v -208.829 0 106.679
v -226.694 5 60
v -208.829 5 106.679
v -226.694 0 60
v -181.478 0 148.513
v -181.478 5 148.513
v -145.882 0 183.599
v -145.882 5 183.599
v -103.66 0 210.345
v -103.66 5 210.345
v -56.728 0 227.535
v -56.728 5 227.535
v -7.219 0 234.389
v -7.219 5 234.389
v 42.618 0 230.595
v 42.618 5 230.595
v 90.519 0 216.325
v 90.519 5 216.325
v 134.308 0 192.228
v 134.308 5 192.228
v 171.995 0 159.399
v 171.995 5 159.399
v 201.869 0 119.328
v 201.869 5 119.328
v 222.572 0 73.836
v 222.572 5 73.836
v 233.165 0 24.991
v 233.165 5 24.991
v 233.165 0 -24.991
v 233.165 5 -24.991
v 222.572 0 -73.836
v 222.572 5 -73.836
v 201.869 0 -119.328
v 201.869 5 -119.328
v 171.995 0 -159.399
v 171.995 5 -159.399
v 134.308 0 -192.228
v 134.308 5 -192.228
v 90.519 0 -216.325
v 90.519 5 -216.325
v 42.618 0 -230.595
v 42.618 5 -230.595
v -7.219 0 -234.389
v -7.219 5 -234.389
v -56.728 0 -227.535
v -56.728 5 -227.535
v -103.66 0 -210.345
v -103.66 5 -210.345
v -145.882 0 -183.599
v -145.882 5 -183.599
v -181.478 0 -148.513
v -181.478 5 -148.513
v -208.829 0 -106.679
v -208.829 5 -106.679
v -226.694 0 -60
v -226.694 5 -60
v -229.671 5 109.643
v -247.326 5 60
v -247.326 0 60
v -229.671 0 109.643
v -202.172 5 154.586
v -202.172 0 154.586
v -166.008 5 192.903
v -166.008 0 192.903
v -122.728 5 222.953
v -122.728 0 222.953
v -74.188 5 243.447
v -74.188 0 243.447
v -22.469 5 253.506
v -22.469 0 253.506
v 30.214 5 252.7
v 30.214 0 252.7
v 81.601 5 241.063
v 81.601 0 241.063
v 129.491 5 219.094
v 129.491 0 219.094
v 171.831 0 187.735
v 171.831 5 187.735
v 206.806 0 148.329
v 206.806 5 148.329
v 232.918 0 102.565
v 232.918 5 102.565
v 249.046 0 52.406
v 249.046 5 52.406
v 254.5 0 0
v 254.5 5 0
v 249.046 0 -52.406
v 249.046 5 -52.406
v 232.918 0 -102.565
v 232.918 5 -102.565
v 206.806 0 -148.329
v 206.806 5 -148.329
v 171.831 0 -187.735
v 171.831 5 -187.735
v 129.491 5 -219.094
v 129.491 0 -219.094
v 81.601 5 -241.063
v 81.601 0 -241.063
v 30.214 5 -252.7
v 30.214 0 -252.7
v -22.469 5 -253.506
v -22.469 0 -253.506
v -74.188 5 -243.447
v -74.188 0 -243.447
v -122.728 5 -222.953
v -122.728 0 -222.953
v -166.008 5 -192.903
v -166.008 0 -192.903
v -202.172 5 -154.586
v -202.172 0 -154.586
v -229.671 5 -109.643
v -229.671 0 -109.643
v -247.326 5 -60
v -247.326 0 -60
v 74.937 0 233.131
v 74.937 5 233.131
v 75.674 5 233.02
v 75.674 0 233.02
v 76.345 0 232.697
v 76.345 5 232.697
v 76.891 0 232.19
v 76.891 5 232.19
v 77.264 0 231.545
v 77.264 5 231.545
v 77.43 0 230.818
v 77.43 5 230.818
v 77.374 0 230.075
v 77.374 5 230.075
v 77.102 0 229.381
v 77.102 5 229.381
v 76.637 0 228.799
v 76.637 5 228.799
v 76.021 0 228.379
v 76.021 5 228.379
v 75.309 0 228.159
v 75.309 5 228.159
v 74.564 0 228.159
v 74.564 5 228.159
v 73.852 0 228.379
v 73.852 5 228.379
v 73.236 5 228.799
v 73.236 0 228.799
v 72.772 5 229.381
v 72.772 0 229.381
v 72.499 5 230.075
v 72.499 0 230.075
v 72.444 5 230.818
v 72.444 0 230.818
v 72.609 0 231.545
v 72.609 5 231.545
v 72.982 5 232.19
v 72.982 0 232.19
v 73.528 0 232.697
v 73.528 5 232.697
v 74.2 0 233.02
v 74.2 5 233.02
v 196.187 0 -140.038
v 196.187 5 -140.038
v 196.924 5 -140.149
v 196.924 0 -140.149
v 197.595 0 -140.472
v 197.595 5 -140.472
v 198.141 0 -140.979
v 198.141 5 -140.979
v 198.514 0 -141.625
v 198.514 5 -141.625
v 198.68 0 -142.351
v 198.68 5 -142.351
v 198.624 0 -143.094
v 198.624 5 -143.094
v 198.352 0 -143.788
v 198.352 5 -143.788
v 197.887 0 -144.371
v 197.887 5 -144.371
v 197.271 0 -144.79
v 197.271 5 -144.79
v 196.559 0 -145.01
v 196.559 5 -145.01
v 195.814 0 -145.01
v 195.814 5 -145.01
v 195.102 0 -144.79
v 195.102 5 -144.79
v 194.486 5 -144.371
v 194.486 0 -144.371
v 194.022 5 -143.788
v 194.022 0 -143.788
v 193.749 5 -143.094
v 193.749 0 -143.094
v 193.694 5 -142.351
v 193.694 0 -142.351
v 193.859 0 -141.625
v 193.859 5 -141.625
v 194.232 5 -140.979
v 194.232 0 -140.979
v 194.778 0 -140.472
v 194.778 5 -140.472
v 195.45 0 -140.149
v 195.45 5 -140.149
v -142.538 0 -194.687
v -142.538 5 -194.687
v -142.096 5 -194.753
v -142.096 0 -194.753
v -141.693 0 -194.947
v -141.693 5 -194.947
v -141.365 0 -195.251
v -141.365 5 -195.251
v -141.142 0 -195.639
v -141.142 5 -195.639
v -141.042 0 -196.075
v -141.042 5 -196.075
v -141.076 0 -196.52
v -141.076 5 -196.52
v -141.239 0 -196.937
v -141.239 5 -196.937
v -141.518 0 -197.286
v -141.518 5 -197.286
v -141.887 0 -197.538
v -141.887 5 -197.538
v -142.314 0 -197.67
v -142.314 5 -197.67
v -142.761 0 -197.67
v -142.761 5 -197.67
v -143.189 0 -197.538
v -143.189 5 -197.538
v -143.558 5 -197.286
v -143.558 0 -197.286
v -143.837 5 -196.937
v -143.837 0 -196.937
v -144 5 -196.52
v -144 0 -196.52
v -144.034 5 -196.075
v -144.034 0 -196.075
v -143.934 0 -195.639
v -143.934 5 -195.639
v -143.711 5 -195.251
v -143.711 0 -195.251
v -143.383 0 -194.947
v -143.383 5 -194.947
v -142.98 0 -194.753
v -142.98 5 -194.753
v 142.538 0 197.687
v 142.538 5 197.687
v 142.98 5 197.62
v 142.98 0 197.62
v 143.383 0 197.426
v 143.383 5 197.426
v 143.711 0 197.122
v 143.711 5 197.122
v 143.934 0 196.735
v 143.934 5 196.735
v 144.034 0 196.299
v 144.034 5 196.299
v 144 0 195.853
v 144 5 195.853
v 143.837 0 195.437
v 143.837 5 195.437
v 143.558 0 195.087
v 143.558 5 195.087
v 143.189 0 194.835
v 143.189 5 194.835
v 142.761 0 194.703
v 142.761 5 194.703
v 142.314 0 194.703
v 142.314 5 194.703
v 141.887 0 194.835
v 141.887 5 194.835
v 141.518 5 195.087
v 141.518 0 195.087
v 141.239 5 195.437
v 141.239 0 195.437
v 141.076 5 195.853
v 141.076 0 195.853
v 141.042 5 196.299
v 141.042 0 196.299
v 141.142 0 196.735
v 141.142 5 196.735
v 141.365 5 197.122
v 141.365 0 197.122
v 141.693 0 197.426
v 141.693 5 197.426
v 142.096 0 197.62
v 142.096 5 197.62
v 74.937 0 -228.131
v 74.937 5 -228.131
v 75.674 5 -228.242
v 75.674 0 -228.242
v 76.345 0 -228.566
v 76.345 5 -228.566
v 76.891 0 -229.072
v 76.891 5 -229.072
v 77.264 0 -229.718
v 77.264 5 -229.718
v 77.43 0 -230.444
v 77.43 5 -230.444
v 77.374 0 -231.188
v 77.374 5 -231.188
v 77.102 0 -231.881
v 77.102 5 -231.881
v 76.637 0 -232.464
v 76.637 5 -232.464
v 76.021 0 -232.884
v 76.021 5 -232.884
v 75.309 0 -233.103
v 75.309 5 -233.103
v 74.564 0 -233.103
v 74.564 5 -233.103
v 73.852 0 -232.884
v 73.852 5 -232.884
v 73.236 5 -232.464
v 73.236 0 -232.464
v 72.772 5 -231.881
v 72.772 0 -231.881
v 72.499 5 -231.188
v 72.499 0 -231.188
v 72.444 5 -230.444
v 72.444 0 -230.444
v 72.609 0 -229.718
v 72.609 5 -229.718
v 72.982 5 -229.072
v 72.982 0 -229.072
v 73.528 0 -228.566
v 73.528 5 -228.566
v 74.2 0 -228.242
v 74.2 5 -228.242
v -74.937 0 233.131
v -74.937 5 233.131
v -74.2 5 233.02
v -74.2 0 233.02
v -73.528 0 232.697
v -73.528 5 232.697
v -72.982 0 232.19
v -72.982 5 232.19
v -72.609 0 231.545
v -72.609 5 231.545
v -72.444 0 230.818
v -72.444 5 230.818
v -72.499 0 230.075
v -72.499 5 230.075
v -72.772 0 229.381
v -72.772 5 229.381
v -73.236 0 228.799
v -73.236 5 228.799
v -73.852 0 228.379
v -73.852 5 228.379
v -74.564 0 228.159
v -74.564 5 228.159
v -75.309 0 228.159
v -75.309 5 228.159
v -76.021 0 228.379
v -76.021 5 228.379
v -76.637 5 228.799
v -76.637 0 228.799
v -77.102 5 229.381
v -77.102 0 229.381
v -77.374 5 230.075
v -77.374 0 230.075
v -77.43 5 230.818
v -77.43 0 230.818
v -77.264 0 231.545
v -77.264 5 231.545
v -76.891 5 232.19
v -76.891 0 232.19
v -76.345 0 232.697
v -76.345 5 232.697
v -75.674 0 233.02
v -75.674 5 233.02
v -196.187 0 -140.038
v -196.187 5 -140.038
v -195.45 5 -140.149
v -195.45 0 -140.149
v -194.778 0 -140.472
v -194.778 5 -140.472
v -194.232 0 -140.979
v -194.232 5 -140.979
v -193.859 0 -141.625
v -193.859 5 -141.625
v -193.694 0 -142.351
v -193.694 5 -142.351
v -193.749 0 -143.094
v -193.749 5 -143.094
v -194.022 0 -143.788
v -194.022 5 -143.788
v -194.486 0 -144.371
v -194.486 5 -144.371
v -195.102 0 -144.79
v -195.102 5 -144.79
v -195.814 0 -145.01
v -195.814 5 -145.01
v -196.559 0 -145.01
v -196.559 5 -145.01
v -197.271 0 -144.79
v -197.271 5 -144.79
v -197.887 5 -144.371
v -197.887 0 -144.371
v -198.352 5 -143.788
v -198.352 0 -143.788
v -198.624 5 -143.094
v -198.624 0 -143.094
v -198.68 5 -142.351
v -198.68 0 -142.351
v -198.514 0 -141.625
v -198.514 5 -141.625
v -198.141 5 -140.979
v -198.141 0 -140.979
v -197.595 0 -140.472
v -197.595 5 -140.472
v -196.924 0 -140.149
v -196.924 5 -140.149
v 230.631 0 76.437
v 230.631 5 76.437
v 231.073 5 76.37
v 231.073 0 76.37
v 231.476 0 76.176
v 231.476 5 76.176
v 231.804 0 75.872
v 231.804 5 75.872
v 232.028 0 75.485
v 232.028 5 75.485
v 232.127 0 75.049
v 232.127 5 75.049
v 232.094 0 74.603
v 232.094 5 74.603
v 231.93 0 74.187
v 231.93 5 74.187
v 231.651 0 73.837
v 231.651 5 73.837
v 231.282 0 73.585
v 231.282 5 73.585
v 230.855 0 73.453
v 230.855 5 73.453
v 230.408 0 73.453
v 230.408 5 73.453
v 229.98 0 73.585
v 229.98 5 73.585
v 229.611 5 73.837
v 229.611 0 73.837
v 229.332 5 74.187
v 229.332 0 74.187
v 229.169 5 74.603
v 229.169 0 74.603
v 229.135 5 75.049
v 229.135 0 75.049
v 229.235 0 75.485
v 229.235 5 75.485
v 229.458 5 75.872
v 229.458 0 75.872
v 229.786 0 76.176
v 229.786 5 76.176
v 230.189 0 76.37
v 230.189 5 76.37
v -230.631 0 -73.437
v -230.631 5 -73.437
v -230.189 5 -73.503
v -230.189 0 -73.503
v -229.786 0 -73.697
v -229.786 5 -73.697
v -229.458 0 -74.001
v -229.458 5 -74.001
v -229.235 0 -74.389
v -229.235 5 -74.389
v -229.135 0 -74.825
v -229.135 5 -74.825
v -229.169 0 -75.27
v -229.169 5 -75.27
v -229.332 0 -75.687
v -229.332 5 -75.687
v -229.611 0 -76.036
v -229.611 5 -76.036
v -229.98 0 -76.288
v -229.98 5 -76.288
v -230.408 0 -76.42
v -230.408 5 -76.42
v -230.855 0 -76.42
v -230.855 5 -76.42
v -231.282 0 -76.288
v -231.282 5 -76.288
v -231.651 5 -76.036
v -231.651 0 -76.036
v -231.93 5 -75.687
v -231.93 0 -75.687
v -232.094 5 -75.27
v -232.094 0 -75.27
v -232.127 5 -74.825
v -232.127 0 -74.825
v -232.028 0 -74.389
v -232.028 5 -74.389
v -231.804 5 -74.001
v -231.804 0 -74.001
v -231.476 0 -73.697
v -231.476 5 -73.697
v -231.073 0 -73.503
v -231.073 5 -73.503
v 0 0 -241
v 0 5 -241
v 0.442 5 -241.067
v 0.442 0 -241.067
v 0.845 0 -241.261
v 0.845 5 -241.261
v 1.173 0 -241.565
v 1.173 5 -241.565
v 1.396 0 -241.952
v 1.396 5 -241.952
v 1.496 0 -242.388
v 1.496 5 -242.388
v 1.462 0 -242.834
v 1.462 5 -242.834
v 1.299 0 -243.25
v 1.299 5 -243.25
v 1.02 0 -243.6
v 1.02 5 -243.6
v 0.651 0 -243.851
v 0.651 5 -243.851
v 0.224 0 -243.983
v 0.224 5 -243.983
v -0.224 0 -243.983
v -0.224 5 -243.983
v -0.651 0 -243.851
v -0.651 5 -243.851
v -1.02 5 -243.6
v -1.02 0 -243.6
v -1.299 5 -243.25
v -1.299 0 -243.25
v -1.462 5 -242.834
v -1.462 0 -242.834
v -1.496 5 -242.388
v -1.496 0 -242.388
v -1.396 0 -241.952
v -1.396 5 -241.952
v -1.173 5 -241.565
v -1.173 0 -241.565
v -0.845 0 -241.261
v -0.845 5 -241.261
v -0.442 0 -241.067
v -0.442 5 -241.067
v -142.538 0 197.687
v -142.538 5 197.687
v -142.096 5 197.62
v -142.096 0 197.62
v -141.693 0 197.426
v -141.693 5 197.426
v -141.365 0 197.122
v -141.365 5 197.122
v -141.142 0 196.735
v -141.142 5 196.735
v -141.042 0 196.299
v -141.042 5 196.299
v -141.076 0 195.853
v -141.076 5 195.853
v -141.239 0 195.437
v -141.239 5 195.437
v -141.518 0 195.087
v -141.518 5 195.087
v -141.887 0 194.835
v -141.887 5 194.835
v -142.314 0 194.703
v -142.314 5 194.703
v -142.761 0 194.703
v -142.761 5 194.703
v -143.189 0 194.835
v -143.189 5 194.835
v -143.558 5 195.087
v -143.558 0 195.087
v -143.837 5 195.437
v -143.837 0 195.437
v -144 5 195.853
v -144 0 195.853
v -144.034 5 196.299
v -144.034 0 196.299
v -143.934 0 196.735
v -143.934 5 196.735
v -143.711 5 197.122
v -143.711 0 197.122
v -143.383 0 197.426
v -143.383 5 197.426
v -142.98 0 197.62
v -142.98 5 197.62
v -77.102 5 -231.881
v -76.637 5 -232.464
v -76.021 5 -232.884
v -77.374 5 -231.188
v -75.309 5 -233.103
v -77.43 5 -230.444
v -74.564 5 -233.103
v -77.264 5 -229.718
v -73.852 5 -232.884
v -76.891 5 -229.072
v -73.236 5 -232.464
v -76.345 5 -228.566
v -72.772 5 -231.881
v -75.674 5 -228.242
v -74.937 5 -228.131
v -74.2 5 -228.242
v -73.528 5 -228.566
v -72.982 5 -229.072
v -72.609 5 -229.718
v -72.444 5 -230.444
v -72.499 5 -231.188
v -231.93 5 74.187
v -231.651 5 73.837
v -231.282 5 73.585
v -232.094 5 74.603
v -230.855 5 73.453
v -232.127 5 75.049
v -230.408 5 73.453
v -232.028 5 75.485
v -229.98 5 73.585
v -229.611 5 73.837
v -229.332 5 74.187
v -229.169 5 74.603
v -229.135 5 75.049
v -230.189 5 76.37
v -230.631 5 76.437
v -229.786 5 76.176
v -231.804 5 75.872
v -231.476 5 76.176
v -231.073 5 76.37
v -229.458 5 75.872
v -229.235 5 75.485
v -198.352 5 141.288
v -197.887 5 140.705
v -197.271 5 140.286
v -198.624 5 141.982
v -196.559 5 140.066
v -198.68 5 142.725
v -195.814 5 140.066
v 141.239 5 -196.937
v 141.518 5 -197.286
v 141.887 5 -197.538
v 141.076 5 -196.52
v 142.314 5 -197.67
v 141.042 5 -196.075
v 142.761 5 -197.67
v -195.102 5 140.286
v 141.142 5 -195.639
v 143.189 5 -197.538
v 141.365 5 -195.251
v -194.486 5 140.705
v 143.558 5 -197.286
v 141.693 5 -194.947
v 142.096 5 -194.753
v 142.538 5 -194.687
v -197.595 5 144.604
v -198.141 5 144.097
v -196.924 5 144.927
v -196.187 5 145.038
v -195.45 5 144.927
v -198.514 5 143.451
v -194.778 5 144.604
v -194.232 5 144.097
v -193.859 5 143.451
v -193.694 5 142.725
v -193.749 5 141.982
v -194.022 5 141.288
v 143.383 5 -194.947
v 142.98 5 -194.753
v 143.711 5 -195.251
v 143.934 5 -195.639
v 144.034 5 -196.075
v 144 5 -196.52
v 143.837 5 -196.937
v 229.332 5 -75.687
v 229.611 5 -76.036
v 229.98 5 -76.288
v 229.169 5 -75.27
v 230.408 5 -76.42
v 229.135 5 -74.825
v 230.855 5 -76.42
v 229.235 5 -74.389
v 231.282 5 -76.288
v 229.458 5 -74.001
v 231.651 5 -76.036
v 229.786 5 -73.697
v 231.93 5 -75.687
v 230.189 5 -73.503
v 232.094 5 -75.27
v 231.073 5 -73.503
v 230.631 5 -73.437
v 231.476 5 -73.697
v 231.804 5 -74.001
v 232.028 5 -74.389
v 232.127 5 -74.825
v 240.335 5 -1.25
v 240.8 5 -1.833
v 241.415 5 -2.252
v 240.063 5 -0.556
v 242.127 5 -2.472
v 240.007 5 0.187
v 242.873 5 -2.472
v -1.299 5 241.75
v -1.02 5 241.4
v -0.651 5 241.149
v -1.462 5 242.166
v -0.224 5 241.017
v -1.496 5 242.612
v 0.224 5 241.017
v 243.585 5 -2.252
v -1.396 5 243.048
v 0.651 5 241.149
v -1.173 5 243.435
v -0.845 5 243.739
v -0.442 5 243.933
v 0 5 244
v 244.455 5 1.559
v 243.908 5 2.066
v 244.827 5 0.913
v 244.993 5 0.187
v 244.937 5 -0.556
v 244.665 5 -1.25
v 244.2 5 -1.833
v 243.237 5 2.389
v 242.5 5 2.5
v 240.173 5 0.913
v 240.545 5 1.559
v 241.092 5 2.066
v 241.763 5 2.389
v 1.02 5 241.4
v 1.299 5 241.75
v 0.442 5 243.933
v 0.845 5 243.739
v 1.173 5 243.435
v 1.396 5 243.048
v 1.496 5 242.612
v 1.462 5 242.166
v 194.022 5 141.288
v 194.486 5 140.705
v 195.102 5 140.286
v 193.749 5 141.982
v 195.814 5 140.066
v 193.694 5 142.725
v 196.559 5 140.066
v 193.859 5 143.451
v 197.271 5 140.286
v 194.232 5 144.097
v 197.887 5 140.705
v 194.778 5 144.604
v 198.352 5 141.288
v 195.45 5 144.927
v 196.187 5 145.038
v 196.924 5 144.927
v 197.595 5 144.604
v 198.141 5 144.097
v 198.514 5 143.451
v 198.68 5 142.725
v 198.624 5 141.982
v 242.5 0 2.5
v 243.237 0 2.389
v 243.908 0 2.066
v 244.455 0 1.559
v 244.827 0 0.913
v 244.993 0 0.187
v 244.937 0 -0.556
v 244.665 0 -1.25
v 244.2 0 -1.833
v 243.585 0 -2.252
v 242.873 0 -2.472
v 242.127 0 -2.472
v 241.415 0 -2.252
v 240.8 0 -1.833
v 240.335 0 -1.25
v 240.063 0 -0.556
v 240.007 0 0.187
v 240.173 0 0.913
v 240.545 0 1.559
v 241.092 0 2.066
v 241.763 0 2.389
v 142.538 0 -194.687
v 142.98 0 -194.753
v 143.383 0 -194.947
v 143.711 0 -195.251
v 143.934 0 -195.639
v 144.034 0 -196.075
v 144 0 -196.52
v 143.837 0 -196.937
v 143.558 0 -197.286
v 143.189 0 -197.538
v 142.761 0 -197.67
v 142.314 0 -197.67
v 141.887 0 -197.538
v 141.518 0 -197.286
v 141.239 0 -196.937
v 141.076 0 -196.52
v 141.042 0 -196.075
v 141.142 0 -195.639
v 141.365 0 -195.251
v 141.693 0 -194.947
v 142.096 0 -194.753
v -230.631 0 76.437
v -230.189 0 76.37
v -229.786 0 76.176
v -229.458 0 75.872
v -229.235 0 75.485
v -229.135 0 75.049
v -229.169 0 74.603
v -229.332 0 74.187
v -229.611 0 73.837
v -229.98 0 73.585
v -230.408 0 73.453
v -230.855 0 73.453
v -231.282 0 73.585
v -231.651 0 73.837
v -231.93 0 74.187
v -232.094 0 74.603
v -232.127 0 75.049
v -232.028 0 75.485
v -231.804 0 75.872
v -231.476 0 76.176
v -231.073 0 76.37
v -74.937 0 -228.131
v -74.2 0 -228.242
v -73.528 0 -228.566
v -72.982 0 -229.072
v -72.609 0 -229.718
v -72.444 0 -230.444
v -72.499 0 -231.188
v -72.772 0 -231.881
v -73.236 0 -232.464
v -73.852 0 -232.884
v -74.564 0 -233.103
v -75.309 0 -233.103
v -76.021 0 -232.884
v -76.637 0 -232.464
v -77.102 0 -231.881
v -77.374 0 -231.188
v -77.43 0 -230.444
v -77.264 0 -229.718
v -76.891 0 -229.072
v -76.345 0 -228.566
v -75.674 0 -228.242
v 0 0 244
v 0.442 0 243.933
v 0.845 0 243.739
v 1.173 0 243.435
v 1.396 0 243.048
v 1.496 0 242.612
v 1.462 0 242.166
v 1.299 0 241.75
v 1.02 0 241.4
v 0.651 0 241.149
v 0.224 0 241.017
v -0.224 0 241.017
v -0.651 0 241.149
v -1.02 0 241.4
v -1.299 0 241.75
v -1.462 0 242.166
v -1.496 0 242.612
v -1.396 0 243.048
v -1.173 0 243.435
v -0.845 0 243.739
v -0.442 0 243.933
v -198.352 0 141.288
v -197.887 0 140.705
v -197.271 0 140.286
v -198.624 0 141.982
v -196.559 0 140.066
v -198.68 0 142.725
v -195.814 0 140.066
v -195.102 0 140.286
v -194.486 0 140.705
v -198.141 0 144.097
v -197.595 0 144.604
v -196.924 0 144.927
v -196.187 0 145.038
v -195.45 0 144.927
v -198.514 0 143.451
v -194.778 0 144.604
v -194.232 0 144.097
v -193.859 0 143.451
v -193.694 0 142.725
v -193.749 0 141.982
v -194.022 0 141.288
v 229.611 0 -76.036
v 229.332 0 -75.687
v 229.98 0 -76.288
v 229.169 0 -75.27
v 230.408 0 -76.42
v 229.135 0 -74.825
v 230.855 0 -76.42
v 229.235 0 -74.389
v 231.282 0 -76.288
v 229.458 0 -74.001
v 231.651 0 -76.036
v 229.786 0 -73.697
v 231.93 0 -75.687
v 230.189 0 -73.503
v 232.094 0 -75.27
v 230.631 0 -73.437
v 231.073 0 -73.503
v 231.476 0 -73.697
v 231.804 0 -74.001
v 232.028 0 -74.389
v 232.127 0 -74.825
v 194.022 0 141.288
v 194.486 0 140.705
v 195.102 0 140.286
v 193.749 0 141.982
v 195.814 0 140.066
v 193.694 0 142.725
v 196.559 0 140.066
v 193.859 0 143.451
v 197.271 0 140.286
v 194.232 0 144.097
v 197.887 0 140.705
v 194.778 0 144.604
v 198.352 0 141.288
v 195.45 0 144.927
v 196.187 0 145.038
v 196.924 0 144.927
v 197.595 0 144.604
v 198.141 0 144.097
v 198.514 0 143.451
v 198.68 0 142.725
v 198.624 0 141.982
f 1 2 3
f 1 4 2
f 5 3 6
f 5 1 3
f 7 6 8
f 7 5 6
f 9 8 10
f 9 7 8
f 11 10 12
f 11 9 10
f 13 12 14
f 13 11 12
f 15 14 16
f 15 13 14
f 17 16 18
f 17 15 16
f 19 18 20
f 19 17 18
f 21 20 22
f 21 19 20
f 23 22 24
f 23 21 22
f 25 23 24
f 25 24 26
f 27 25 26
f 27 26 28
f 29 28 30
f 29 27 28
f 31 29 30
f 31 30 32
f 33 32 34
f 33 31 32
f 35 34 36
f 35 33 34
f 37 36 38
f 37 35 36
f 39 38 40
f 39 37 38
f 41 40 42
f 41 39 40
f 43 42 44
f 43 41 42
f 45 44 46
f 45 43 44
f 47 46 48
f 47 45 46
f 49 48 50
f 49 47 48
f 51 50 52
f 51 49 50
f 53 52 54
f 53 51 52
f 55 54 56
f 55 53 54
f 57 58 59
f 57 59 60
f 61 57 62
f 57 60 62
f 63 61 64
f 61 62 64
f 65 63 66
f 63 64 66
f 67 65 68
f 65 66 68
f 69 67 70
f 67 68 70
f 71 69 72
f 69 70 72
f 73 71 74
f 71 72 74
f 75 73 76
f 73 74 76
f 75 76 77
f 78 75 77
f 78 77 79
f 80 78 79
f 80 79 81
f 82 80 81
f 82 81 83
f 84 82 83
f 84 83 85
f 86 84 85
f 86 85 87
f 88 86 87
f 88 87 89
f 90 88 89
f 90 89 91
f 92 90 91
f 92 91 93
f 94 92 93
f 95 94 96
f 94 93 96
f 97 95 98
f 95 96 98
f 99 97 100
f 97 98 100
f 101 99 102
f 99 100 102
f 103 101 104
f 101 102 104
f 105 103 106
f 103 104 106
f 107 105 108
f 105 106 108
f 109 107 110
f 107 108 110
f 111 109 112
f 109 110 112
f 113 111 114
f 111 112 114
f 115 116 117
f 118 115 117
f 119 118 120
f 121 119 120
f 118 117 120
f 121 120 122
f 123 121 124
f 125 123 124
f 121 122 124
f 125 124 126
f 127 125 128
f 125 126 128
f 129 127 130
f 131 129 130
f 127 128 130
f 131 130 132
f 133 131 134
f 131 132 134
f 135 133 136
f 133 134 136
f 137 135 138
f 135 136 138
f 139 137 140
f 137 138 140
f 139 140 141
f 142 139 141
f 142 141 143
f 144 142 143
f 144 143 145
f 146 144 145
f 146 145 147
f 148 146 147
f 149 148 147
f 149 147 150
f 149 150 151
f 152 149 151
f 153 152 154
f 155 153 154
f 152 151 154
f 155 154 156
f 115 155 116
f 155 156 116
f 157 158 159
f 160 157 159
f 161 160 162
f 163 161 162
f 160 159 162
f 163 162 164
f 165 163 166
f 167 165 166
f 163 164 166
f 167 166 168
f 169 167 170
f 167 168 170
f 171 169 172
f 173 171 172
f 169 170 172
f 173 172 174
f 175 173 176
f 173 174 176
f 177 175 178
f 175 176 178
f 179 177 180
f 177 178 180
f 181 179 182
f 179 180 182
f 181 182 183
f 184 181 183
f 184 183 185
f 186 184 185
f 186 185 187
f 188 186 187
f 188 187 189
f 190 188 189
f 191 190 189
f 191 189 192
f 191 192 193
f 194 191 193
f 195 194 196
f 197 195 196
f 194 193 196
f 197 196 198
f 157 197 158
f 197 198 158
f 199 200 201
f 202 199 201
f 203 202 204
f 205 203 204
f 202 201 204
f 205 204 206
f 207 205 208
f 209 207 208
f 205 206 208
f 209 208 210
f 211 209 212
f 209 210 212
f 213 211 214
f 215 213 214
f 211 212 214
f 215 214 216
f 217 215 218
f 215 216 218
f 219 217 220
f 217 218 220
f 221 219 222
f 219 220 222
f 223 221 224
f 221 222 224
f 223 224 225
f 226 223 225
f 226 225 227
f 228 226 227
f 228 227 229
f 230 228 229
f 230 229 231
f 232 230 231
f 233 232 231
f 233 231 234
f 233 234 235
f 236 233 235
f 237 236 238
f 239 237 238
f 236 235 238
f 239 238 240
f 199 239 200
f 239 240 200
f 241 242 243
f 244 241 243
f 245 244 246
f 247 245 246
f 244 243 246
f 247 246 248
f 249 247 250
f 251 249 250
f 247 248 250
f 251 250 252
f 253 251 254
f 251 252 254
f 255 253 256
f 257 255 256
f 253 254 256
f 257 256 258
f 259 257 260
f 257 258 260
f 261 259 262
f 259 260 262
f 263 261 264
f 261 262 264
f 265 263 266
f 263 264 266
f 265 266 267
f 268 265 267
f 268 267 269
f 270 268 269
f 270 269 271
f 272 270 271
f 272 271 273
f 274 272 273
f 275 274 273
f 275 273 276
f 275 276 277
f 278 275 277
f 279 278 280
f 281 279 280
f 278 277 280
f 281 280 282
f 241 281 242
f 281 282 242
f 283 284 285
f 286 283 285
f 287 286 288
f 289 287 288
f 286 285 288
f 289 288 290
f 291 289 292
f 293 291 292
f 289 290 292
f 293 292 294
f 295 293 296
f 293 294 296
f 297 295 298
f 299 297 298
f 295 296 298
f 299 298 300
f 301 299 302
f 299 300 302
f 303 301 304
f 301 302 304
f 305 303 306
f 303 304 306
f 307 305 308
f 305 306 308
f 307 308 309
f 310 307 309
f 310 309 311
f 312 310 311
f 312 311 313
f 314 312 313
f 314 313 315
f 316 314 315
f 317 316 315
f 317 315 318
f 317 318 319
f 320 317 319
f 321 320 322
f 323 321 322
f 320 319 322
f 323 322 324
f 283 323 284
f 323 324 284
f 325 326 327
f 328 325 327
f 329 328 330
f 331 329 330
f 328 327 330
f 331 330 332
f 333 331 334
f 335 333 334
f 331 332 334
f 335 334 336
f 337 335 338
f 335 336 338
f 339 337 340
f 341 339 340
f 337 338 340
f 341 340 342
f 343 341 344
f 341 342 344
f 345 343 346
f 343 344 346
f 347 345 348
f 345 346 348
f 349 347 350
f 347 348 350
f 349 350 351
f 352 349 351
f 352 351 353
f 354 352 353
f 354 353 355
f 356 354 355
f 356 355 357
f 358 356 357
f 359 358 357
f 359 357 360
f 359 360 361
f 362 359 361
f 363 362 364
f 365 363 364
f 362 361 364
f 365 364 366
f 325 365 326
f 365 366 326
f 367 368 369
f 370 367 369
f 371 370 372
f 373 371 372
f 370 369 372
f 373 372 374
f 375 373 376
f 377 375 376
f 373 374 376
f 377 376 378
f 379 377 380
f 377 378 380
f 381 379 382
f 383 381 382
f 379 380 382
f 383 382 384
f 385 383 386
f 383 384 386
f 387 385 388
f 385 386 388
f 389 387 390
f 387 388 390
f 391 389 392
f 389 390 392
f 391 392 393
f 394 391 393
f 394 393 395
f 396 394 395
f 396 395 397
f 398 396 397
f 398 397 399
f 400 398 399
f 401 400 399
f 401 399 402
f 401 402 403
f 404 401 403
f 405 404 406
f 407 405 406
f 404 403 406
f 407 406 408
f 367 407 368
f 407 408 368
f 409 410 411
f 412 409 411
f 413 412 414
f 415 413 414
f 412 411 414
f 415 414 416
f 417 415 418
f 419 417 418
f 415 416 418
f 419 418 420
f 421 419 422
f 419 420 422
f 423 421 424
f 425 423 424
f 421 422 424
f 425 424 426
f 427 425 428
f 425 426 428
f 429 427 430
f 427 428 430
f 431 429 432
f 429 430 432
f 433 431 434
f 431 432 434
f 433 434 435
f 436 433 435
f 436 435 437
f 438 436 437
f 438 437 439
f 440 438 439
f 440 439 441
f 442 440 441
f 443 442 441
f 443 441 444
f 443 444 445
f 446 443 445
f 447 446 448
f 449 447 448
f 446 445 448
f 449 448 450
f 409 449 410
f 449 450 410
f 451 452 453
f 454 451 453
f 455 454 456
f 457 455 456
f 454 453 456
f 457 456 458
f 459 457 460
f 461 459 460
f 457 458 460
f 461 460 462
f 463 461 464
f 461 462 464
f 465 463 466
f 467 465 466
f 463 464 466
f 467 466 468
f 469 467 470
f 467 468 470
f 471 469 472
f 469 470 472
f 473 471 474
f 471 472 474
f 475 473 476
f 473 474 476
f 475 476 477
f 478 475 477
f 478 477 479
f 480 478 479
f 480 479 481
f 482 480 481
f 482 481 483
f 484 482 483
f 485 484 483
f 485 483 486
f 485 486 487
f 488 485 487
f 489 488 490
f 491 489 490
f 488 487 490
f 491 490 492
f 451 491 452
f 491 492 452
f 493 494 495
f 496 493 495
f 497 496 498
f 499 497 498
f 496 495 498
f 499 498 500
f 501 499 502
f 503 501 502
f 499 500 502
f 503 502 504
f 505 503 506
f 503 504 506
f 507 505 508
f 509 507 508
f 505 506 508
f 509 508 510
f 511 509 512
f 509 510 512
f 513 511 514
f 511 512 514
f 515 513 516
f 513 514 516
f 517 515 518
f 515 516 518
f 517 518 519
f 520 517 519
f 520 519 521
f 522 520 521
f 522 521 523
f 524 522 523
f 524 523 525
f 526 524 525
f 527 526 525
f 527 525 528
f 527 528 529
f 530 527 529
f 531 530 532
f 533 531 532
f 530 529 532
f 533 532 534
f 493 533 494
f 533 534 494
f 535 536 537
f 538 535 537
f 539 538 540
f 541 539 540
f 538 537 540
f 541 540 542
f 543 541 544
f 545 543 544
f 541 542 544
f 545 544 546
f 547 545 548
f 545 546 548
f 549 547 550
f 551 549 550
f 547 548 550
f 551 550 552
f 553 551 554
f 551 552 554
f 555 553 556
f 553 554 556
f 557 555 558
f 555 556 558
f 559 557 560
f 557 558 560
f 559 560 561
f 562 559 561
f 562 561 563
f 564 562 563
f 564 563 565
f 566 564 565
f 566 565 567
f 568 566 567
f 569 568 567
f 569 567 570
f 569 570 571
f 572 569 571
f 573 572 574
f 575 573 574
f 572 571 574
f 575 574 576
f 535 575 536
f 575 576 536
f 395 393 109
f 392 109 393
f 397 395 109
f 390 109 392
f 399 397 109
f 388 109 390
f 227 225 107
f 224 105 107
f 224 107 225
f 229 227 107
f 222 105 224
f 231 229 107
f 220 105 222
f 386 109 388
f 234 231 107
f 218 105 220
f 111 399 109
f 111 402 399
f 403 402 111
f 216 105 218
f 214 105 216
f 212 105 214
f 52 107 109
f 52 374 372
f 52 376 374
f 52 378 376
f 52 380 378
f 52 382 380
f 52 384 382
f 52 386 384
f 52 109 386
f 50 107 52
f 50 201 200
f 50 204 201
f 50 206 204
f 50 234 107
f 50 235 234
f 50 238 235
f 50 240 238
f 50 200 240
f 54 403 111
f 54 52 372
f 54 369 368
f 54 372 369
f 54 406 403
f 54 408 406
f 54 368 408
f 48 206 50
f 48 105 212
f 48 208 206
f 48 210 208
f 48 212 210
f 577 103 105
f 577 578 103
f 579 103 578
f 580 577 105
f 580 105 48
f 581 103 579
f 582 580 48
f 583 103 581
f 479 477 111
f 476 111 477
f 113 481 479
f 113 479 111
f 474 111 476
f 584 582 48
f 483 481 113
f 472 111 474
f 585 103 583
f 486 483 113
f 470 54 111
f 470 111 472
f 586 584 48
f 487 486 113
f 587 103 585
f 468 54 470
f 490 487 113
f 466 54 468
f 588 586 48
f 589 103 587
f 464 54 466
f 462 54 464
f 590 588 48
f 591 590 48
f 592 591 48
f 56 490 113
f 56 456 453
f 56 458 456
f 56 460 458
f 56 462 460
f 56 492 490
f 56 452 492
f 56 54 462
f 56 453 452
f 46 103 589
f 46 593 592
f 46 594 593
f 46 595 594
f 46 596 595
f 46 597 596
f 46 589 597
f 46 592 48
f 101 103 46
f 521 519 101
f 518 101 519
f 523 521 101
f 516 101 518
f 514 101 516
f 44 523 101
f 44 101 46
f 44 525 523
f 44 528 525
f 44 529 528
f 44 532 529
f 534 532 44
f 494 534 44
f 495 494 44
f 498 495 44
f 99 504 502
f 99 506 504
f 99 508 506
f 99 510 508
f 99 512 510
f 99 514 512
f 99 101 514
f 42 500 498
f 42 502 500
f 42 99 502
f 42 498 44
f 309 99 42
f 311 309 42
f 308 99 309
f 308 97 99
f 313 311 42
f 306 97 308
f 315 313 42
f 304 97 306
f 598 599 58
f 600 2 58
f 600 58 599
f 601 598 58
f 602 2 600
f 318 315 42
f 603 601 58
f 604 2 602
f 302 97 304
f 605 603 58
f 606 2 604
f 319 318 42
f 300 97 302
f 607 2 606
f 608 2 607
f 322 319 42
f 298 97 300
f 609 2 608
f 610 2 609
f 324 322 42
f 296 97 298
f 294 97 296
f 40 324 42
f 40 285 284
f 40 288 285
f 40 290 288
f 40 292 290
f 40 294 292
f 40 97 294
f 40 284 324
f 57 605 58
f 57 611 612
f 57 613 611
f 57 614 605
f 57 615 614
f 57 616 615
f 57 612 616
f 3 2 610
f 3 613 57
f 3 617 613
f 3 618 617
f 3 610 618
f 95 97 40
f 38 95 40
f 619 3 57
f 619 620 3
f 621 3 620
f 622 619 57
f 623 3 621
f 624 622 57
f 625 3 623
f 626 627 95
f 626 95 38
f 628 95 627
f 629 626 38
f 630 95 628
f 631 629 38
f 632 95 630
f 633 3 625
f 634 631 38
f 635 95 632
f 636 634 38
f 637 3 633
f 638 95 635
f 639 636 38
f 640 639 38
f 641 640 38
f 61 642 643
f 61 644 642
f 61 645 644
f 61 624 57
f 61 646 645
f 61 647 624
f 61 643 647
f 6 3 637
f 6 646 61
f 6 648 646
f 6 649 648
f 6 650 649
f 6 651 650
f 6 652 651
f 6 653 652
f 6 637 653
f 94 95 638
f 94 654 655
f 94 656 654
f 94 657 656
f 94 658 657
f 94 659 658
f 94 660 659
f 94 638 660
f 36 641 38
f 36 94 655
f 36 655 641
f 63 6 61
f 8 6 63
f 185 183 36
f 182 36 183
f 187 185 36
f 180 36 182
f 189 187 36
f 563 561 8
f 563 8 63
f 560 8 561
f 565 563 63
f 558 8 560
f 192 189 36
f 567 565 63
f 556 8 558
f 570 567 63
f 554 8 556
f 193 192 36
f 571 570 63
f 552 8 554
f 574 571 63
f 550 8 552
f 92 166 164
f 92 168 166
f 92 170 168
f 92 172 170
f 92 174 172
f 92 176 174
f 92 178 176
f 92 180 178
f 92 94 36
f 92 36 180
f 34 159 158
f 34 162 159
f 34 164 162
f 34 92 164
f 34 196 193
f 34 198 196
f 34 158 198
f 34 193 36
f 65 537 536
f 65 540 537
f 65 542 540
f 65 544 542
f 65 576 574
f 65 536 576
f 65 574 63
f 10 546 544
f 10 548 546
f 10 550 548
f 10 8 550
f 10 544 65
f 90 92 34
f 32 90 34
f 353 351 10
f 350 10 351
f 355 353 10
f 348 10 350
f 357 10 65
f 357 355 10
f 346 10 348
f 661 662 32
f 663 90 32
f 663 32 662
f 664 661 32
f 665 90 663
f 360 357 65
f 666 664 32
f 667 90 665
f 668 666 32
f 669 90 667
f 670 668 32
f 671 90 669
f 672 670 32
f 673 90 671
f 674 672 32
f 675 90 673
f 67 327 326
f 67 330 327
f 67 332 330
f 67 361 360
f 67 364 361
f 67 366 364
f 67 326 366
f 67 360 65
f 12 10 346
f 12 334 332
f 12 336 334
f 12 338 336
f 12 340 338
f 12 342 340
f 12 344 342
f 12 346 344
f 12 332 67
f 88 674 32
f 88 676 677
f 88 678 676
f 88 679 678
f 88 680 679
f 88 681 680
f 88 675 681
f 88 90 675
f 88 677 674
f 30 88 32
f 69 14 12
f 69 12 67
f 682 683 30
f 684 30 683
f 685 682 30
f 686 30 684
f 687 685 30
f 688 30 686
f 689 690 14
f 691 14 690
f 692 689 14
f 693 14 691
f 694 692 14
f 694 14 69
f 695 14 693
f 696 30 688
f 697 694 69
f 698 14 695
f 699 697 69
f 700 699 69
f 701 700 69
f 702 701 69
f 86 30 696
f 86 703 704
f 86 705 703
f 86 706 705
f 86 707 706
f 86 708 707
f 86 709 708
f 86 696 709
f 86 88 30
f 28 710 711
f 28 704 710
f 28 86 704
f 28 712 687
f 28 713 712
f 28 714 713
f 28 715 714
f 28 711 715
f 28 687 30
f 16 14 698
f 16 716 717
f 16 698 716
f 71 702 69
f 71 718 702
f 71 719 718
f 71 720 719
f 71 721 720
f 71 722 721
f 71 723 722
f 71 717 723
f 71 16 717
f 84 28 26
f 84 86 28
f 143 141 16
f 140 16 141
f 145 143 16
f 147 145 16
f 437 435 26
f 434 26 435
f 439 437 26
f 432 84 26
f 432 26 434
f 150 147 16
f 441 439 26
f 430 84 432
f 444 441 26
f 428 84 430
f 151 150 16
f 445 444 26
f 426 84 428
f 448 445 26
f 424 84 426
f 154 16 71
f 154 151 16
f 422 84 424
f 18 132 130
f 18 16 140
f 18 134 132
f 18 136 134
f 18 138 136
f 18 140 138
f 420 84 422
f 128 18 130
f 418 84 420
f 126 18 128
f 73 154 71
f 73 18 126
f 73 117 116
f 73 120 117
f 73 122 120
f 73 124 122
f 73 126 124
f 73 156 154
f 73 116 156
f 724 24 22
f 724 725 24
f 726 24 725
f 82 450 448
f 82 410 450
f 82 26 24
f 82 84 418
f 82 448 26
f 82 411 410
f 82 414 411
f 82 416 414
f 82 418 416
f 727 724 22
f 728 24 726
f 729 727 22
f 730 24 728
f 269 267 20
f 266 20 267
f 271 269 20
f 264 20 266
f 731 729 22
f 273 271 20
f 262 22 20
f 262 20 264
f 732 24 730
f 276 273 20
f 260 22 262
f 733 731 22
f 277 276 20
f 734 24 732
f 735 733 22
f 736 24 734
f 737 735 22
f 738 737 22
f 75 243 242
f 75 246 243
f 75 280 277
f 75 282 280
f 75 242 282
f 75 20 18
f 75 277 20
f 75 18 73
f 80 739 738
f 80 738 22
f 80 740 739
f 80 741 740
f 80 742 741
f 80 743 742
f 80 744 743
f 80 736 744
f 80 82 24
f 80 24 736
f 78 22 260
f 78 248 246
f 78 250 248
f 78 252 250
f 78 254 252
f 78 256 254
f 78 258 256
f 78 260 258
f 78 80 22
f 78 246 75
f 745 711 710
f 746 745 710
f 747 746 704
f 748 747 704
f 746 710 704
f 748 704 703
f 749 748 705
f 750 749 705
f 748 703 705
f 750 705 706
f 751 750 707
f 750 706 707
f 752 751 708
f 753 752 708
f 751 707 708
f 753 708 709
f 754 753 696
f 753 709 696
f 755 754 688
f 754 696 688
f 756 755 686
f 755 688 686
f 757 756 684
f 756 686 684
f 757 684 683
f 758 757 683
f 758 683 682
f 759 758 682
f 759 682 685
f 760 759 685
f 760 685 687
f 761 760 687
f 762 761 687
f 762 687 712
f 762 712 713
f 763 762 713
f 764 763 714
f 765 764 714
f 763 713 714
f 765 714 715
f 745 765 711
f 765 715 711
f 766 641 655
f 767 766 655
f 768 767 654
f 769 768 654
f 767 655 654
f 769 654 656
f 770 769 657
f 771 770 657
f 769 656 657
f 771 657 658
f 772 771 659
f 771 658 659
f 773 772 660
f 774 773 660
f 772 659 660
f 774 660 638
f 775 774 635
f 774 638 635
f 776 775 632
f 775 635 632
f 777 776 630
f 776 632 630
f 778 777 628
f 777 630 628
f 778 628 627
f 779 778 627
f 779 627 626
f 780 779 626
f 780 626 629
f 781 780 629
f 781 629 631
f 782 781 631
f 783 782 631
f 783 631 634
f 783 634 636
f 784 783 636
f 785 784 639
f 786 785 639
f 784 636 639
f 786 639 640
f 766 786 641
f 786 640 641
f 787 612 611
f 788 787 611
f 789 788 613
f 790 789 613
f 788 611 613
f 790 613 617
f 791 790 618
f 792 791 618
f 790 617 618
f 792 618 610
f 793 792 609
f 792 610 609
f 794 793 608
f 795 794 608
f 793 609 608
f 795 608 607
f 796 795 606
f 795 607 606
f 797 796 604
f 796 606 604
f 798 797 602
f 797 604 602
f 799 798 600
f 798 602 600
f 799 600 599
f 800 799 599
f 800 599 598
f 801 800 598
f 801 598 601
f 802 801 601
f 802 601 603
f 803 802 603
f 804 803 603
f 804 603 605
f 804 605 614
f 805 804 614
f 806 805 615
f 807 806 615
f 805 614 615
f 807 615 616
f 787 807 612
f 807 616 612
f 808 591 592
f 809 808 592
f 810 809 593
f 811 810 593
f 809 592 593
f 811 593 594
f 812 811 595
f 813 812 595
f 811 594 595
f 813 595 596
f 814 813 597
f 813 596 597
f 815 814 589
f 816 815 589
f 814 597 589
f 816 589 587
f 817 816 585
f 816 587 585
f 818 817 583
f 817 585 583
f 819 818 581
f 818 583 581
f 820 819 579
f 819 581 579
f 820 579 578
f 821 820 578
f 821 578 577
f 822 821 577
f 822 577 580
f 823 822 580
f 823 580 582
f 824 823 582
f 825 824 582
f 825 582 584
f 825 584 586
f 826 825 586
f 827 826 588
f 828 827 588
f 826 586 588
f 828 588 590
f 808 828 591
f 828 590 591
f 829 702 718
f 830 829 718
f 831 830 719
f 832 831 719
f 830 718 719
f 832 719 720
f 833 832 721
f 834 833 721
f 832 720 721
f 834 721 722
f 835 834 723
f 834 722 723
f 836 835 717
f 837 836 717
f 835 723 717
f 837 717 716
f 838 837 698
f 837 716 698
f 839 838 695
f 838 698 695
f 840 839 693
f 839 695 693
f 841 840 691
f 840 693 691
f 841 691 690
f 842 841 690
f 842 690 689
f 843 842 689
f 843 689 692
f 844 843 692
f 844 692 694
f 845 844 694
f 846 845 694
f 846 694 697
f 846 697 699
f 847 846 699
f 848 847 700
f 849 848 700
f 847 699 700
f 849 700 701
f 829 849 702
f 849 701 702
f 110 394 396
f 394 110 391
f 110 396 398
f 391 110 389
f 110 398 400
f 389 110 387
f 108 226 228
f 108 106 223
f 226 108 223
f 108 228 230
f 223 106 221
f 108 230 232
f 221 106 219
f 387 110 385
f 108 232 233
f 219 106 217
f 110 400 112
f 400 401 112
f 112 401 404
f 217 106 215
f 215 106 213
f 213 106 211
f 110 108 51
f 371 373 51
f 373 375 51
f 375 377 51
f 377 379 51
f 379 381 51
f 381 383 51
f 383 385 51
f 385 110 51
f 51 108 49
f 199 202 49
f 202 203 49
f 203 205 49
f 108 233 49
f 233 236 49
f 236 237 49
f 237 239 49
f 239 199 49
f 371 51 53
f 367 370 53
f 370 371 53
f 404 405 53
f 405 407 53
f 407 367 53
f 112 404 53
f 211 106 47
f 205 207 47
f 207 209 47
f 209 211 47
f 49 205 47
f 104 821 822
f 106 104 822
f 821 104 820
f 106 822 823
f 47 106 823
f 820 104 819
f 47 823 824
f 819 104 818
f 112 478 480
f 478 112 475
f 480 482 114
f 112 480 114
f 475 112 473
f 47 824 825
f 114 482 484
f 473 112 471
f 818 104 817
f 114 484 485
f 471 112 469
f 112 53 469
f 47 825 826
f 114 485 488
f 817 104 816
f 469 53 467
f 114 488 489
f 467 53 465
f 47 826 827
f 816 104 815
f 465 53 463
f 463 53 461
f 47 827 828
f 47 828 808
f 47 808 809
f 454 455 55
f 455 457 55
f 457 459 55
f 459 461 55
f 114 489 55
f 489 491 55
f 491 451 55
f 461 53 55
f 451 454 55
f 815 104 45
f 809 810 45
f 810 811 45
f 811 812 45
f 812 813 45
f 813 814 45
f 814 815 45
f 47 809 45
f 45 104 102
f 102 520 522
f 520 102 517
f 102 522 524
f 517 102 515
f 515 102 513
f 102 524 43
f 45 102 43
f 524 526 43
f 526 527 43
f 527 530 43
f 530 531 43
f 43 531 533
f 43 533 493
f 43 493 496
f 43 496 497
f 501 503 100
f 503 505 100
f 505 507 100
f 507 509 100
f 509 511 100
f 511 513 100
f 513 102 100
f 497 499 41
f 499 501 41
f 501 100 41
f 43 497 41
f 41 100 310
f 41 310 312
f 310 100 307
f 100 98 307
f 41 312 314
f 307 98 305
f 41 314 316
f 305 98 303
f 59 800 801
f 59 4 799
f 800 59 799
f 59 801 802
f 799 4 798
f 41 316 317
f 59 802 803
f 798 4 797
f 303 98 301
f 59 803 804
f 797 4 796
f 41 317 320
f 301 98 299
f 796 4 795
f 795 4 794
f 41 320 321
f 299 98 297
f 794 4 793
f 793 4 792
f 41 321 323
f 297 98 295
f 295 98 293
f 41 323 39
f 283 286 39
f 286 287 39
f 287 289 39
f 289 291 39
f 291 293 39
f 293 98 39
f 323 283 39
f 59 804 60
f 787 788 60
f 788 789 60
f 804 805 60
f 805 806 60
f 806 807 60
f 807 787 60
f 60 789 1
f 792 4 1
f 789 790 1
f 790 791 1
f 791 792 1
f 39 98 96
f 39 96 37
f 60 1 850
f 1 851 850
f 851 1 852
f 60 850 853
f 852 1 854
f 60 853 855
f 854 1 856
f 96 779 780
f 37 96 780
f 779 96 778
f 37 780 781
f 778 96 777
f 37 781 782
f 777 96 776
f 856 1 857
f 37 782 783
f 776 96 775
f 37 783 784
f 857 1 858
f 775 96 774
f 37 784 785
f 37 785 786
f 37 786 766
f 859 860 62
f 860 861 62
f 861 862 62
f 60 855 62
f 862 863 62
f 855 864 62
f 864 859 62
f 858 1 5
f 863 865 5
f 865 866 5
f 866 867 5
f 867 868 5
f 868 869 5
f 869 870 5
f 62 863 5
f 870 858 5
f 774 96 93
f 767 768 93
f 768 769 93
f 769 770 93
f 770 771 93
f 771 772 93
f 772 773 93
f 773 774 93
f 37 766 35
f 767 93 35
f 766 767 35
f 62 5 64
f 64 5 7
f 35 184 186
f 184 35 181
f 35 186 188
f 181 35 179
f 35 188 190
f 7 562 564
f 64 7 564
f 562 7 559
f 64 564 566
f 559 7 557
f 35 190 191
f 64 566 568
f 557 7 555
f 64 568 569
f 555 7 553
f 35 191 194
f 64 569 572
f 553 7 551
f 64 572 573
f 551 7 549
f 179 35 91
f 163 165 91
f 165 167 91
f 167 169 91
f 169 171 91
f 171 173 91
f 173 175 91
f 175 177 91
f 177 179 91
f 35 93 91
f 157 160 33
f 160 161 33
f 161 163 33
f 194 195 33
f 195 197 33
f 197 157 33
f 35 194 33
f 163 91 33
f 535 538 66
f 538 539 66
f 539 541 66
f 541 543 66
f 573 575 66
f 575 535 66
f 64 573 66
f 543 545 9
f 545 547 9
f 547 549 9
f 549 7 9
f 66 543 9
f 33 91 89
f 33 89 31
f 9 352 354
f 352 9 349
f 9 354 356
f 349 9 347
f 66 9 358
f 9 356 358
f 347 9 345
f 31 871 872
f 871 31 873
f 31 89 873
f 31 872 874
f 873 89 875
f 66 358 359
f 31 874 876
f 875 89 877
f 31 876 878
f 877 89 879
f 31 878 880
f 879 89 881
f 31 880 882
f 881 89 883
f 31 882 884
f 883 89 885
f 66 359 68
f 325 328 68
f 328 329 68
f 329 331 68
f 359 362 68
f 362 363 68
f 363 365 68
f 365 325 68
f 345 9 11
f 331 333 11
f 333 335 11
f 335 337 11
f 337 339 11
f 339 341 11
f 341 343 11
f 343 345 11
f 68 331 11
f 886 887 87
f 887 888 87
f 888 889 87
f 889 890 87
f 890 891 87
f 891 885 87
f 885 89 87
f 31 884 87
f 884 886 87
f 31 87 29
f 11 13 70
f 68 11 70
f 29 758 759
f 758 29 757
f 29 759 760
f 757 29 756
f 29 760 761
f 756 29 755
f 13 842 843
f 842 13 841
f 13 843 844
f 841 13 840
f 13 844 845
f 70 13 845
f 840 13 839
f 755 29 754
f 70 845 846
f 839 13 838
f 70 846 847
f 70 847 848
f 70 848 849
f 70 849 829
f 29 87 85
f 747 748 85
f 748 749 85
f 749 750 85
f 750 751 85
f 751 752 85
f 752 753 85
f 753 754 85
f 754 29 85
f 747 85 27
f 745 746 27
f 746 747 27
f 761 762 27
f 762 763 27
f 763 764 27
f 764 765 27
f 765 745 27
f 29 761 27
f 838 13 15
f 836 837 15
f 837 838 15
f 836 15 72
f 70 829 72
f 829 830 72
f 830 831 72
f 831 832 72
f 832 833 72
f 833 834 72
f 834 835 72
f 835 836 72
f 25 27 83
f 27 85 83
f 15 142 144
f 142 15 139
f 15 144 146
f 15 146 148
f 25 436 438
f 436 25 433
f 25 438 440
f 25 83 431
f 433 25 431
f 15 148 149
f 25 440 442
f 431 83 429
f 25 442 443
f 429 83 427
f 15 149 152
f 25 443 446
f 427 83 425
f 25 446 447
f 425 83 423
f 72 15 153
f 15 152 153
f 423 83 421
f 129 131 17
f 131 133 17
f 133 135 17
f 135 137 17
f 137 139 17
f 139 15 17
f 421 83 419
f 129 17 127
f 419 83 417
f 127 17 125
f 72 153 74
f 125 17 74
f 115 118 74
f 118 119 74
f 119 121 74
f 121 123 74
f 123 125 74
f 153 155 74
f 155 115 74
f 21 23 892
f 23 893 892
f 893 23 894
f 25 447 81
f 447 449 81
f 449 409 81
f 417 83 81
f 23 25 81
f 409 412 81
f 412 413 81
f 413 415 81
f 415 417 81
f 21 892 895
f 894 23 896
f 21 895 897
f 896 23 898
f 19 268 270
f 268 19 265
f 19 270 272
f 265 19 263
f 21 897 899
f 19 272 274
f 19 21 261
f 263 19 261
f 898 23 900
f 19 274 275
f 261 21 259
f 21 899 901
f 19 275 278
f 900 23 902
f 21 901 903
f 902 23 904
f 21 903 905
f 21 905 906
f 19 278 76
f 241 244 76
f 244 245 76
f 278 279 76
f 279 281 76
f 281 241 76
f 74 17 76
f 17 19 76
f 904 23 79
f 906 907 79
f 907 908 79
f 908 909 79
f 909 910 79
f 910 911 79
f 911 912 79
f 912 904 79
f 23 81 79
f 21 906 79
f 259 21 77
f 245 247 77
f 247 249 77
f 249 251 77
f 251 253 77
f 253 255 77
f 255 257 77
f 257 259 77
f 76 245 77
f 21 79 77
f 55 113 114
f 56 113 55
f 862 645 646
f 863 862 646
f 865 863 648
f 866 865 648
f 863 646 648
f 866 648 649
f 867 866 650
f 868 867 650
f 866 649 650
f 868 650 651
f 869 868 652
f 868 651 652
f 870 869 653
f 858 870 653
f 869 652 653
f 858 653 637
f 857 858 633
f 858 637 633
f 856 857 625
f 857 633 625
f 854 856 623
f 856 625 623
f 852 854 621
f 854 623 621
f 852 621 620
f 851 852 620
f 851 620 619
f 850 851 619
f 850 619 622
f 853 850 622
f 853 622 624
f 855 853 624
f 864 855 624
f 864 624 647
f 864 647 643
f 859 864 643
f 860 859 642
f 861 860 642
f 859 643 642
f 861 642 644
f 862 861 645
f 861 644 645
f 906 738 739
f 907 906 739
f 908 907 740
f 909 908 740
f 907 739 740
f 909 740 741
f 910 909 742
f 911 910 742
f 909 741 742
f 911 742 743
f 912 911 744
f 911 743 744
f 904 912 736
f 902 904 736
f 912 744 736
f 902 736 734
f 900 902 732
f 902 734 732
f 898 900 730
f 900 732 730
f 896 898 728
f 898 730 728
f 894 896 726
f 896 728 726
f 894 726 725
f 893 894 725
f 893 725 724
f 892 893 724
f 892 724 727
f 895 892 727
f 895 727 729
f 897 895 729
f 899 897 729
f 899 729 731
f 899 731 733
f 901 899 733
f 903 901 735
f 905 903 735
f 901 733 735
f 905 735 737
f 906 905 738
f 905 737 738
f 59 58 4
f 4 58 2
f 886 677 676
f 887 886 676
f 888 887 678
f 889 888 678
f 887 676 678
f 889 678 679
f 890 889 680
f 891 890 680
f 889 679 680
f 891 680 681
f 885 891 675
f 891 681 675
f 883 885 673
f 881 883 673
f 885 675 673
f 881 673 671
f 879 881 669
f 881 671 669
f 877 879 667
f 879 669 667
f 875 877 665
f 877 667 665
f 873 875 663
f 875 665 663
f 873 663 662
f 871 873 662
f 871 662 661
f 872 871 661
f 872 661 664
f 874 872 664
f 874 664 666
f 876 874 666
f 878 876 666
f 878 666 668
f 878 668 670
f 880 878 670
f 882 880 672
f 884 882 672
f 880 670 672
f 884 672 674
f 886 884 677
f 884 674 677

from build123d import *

# Parameters (mm, degrees)
SKETCH1_R           = 254.5
SKETCH1_R_2         = 234.5
BOSS_EXTRUDE1_DEPTH = 5
SKETCH2_W           = 27.805822748
SKETCH2_H           = 60
CUT_EXTRUDE1_DEPTH  = 5
SKETCH3_R           = 2.5
CUT_EXTRUDE2_DEPTH  = 5
SKETCH4_R           = 1.5
CUT_EXTRUDE3_DEPTH  = 5


with BuildPart() as part:
    # Sketch1 → Boss-Extrude1 (new body)
    with BuildSketch(Plane(origin=(0, 0, 0), x_dir=(1, 0, 0), z_dir=(0, 1, 0))):
        with Locations(Location((0, 0, 0), (0, 0, 270))):
            Circle(SKETCH1_R)
        with Locations(Location((0, 0, 0), (0, 0, 270))):
            Circle(SKETCH1_R_2, mode=Mode.SUBTRACT)
    extrude(amount=BOSS_EXTRUDE1_DEPTH)

    # Sketch2 → Cut-Extrude1 (cut)
    with BuildSketch(Plane(origin=(0, 5, 0), x_dir=(1, 0, 0), z_dir=(0, 1, 0))):
        with Locations((-240.597088626, 30)):
            Rectangle(SKETCH2_W, SKETCH2_H)
    cut_extrude1 = extrude(amount=-CUT_EXTRUDE1_DEPTH, mode=Mode.SUBTRACT)

    # Mirror1: Cut-Extrude1 across plane
    add(cut_extrude1.mirror(Plane.XY), mode=Mode.SUBTRACT)

    # Sketch3 → Cut-Extrude2 (cut)
    with BuildSketch(Plane(origin=(0, 5, 0), x_dir=(1, 0, 0), z_dir=(0, 1, 0))):
        with Locations(Location((242.5, 0, 0), (0, 0, 270))):
            Circle(SKETCH3_R)
        with Locations(Location((196.186621136, -142.537923681, 0), (0, 0, 270))):
            Circle(SKETCH3_R)
        with Locations(Location((74.936621136, -230.631205202, 0), (0, 0, 270))):
            Circle(SKETCH3_R)
        with Locations(Location((-74.936621136, -230.631205202, 0), (0, 0, 270))):
            Circle(SKETCH3_R)
        with Locations(Location((-196.186621136, -142.537923681, 0), (0, 0, 270))):
            Circle(SKETCH3_R)
        with Locations((-242.5, 0)):
            Circle(SKETCH3_R)
        with Locations(Location((-196.186621136, 142.537923681, 0), (0, 0, 270))):
            Circle(SKETCH3_R)
        with Locations(Location((-74.936621136, 230.631205202, 0), (0, 0, 270))):
            Circle(SKETCH3_R)
        with Locations(Location((74.936621136, 230.631205202, 0), (0, 0, 270))):
            Circle(SKETCH3_R)
        with Locations(Location((196.186621136, 142.537923681, 0), (0, 0, 270))):
            Circle(SKETCH3_R)
    extrude(amount=-CUT_EXTRUDE2_DEPTH, mode=Mode.SUBTRACT)

    # Sketch4 → Cut-Extrude3 (cut)
    with BuildSketch(Plane(origin=(0, 5, 0), x_dir=(1, 0, 0), z_dir=(0, 1, 0))):
        with Locations(Location((0, -242.5, 0), (0, 0, 270))):
            Circle(SKETCH4_R)
        with Locations(Location((-142.537923681, -196.186621136, 0), (0, 0, 270))):
            Circle(SKETCH4_R)
        with Locations(Location((-230.631205202, -74.936621136, 0), (0, 0, 270))):
            Circle(SKETCH4_R)
        with Locations(Location((-230.631205202, 74.936621136, 0), (0, 0, 270))):
            Circle(SKETCH4_R)
        with Locations(Location((-142.537923681, 196.186621136, 0), (0, 0, 270))):
            Circle(SKETCH4_R)
        with Locations(Location((0, 242.5, 0), (0, 0, 270))):
            Circle(SKETCH4_R)
        with Locations(Location((142.537923681, 196.186621136, 0), (0, 0, 270))):
            Circle(SKETCH4_R)
        with Locations(Location((230.631205202, 74.936621136, 0), (0, 0, 270))):
            Circle(SKETCH4_R)
        with Locations(Location((230.631205202, -74.936621136, 0), (0, 0, 270))):
            Circle(SKETCH4_R)
        with Locations(Location((142.537923681, -196.186621136, 0), (0, 0, 270))):
            Circle(SKETCH4_R)
    extrude(amount=-CUT_EXTRUDE3_DEPTH, mode=Mode.SUBTRACT)


solid = part.part
